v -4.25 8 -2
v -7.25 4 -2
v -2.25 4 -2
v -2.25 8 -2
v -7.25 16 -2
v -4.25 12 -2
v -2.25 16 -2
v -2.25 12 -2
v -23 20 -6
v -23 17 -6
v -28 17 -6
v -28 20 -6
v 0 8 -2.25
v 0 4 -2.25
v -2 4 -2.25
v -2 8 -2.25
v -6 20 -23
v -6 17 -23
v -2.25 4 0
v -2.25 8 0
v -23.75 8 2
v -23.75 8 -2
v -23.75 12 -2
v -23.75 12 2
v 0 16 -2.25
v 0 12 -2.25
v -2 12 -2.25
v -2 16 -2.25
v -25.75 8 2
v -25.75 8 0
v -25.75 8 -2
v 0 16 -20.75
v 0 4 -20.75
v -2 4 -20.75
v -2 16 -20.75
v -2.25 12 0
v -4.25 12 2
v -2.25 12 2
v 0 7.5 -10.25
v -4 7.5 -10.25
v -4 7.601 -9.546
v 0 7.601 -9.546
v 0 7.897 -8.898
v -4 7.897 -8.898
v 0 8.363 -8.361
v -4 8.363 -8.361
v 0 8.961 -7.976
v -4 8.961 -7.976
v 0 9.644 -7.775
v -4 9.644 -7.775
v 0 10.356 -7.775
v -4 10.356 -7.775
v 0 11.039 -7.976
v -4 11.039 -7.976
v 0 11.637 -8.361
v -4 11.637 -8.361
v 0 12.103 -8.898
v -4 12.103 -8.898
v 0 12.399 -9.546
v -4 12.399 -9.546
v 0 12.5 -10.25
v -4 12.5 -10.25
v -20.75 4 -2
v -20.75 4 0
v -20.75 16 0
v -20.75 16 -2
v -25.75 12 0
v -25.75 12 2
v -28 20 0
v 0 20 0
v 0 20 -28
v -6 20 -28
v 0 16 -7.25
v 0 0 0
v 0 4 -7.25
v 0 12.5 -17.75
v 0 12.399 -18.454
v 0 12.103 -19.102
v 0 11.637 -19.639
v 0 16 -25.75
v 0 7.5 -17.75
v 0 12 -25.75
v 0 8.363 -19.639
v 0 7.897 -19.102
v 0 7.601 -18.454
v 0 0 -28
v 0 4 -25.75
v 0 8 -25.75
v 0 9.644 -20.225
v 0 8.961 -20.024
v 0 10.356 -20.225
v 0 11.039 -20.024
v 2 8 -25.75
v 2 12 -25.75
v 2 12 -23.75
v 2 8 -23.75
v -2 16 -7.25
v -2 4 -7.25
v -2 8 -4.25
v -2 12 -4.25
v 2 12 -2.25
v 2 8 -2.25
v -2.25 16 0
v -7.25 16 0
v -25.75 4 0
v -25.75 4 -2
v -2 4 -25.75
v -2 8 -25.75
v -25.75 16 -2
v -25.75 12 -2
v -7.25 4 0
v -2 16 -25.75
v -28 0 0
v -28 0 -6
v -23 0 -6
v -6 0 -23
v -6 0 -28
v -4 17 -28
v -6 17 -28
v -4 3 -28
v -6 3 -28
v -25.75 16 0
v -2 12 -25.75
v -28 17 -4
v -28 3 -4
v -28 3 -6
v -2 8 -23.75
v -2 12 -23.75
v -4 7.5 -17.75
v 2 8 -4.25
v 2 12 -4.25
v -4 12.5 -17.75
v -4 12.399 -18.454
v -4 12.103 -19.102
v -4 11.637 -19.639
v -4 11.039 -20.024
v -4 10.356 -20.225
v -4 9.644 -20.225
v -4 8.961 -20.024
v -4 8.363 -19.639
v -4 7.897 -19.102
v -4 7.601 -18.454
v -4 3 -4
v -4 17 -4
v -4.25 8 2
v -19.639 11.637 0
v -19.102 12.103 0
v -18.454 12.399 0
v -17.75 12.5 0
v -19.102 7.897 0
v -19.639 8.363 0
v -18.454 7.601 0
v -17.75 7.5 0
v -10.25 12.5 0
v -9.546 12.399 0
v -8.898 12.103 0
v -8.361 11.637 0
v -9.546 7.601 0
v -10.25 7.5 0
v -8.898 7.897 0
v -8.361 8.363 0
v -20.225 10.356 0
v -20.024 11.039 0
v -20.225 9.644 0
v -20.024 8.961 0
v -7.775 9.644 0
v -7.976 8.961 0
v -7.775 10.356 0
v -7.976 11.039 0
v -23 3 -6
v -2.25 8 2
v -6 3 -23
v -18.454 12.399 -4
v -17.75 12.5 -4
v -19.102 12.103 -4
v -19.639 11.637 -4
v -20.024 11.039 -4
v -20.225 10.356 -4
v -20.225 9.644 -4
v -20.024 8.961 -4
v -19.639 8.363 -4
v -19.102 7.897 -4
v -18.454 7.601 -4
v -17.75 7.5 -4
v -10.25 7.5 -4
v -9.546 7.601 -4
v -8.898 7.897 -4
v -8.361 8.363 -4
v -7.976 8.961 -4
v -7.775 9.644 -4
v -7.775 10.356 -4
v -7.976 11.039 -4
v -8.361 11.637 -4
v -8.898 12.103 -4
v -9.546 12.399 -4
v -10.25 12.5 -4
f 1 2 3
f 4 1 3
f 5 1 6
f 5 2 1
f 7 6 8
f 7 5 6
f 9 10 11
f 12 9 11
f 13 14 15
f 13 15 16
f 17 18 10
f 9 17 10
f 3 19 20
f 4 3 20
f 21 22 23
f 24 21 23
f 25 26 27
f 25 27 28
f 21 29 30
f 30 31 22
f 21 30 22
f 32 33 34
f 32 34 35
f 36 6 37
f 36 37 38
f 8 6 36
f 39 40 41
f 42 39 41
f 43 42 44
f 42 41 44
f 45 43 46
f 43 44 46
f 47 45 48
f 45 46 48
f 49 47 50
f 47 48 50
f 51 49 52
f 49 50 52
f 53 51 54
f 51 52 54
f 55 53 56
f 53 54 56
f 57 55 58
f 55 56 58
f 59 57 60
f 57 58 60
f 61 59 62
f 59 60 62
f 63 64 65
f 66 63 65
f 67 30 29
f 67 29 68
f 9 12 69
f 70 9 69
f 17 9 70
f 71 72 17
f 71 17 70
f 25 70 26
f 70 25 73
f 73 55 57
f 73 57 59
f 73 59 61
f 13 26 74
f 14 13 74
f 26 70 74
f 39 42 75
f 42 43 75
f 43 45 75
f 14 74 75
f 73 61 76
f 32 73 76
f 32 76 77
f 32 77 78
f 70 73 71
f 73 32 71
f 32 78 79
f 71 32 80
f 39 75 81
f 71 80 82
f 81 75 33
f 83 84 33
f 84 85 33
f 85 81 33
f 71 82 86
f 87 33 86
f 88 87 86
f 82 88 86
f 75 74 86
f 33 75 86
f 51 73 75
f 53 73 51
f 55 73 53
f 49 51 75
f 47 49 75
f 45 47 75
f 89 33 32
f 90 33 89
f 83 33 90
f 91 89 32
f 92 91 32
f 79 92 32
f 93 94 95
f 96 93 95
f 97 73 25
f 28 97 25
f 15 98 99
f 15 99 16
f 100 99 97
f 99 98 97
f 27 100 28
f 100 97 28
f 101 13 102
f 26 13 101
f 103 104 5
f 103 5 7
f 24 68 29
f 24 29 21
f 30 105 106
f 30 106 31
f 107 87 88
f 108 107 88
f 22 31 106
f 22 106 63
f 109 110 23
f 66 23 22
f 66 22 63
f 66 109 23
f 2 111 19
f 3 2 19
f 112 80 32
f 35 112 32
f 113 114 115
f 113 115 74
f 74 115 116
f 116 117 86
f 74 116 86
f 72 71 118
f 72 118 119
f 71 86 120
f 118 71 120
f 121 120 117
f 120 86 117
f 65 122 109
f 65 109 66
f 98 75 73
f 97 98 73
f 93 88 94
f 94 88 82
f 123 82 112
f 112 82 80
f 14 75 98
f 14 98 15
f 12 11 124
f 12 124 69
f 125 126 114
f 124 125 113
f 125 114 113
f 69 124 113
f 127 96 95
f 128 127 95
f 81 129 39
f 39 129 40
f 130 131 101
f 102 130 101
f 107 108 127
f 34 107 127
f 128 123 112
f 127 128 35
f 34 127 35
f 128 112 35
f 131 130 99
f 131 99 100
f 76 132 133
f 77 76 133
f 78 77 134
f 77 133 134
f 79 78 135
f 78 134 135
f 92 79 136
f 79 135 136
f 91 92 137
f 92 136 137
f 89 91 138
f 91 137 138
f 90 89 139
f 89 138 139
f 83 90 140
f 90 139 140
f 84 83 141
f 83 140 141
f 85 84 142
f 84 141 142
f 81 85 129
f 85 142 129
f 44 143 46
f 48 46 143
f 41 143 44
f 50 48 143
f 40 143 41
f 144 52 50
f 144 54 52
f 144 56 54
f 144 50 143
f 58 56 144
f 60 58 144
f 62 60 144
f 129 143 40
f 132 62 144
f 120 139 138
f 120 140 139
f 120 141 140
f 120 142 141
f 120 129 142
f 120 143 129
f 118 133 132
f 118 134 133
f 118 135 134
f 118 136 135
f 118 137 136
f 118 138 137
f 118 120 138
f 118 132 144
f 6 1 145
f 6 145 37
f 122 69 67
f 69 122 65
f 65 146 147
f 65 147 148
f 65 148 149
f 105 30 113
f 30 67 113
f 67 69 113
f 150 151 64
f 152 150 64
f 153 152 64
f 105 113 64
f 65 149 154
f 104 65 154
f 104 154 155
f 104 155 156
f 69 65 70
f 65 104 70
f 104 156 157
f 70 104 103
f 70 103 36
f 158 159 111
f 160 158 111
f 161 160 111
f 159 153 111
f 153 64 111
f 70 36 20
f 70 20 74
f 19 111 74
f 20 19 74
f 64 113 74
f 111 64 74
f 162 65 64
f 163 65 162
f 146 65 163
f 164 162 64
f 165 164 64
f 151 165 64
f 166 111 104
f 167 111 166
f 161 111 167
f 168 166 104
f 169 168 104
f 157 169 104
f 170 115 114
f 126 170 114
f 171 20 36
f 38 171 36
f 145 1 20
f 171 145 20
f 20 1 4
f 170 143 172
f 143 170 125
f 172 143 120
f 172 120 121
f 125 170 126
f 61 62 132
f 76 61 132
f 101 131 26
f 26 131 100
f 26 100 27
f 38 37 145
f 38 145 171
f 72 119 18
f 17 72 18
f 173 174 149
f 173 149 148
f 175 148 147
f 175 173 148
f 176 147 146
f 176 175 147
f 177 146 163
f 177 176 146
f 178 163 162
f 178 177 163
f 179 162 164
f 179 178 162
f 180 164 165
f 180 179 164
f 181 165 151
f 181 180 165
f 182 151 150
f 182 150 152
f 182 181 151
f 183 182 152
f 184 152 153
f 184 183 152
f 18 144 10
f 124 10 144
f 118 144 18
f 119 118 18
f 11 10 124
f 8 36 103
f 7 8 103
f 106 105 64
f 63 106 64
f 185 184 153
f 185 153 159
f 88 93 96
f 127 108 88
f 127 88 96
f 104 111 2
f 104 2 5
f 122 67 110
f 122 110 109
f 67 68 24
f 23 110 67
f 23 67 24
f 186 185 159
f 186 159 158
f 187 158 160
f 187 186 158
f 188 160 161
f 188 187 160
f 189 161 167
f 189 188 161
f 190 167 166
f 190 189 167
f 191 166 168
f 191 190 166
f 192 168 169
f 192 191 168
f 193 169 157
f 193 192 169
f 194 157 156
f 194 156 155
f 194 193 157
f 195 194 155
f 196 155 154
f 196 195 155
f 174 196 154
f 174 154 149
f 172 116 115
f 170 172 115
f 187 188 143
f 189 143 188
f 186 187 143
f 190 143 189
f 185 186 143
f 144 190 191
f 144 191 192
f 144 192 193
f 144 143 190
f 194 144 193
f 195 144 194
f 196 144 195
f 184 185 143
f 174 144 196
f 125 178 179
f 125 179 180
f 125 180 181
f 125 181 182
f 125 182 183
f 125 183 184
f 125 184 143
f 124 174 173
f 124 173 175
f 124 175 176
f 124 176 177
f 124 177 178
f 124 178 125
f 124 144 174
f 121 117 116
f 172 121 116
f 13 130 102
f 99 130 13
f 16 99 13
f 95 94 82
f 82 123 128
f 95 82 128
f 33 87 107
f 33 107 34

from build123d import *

# Parameters (mm, degrees)
BOSS_EXTRUDE1_DEPTH = 20
SKETCH2_W           = 24
SKETCH2_H           = 14
CUT_EXTRUDE1_DEPTH  = 24
SKETCH3_W           = 5
SKETCH3_H           = 12
CUT_EXTRUDE2_DEPTH  = 2
SKETCH4_W           = 2
SKETCH4_H           = 4
BOSS_EXTRUDE2_DEPTH = 4
CUT_EXTRUDE3_DEPTH  = 4


with BuildPart() as part:
    # Sketch1 → Boss-Extrude1 (new body)
    with BuildSketch(Plane(origin=(0, 0, 0), x_dir=(1, 0, 0), z_dir=(0, 1, 0))):
        Polygon((-28, 0), (0, 0), (0, 28), (-6, 28), (-6, 23), (-23, 6), (-28, 6), align=None)
    extrude(amount=BOSS_EXTRUDE1_DEPTH)

    # Sketch2 → Cut-Extrude1 (cut)
    with BuildSketch(Plane(origin=(0, 0, -28), x_dir=(-1, 0, 0), z_dir=(0, 0, -1))):
        with Locations((16, 10)):
            Rectangle(SKETCH2_W, SKETCH2_H)
    extrude(amount=-CUT_EXTRUDE1_DEPTH, mode=Mode.SUBTRACT)

    # Sketch3 → Cut-Extrude2 (cut)
    with BuildSketch(Plane.XY):
        with Locations((-23.25, 10)):
            Rectangle(SKETCH3_W, SKETCH3_H)
        with Locations((-4.75, 10)):
            Rectangle(SKETCH3_W, SKETCH3_H)
    cut_extrude2 = extrude(amount=-CUT_EXTRUDE2_DEPTH, mode=Mode.SUBTRACT)

    # Sketch4 → Boss-Extrude2 (add)
    with BuildSketch(Plane.XY.offset(-2)):
        with Locations((-24.75, 10)):
            Rectangle(SKETCH4_W, SKETCH4_H)
        with Locations((-3.25, 10)):
            Rectangle(SKETCH4_W, SKETCH4_H)
    boss_extrude2 = extrude(amount=BOSS_EXTRUDE2_DEPTH)

    # Mirror11: Cut-Extrude2, Boss-Extrude2 across plane
    add(cut_extrude2.mirror(Plane(origin=(0, 0, 0), x_dir=(0.707106781, 0, 0.707106781), z_dir=(-0.707106781, 0, 0.707106781))), mode=Mode.SUBTRACT)
    add(boss_extrude2.mirror(Plane(origin=(0, 0, 0), x_dir=(0.707106781, 0, 0.707106781), z_dir=(-0.707106781, 0, 0.707106781))))

    # Sketch5 → Cut-Extrude3 (cut)
    with BuildSketch(Plane(origin=(0, 0, -4), x_dir=(-1, 0, 0), z_dir=(0, 0, -1))):
        with BuildLine():
            Line((10.25, 12.5), (17.75, 12.5))
            ThreePointArc((17.75, 12.5), (20.25, 10), (17.75, 7.5))
            Line((17.75, 7.5), (10.25, 7.5))
            ThreePointArc((10.25, 7.5), (7.75, 10), (10.25, 12.5))
        make_face()
    cut_extrude3 = extrude(amount=-CUT_EXTRUDE3_DEPTH, mode=Mode.SUBTRACT)

    # Mirror12: Cut-Extrude3 across plane
    add(cut_extrude3.mirror(Plane(origin=(0, 0, 0), x_dir=(0.707106781, 0, 0.707106781), z_dir=(-0.707106781, 0, 0.707106781))), mode=Mode.SUBTRACT)


solid = part.part
